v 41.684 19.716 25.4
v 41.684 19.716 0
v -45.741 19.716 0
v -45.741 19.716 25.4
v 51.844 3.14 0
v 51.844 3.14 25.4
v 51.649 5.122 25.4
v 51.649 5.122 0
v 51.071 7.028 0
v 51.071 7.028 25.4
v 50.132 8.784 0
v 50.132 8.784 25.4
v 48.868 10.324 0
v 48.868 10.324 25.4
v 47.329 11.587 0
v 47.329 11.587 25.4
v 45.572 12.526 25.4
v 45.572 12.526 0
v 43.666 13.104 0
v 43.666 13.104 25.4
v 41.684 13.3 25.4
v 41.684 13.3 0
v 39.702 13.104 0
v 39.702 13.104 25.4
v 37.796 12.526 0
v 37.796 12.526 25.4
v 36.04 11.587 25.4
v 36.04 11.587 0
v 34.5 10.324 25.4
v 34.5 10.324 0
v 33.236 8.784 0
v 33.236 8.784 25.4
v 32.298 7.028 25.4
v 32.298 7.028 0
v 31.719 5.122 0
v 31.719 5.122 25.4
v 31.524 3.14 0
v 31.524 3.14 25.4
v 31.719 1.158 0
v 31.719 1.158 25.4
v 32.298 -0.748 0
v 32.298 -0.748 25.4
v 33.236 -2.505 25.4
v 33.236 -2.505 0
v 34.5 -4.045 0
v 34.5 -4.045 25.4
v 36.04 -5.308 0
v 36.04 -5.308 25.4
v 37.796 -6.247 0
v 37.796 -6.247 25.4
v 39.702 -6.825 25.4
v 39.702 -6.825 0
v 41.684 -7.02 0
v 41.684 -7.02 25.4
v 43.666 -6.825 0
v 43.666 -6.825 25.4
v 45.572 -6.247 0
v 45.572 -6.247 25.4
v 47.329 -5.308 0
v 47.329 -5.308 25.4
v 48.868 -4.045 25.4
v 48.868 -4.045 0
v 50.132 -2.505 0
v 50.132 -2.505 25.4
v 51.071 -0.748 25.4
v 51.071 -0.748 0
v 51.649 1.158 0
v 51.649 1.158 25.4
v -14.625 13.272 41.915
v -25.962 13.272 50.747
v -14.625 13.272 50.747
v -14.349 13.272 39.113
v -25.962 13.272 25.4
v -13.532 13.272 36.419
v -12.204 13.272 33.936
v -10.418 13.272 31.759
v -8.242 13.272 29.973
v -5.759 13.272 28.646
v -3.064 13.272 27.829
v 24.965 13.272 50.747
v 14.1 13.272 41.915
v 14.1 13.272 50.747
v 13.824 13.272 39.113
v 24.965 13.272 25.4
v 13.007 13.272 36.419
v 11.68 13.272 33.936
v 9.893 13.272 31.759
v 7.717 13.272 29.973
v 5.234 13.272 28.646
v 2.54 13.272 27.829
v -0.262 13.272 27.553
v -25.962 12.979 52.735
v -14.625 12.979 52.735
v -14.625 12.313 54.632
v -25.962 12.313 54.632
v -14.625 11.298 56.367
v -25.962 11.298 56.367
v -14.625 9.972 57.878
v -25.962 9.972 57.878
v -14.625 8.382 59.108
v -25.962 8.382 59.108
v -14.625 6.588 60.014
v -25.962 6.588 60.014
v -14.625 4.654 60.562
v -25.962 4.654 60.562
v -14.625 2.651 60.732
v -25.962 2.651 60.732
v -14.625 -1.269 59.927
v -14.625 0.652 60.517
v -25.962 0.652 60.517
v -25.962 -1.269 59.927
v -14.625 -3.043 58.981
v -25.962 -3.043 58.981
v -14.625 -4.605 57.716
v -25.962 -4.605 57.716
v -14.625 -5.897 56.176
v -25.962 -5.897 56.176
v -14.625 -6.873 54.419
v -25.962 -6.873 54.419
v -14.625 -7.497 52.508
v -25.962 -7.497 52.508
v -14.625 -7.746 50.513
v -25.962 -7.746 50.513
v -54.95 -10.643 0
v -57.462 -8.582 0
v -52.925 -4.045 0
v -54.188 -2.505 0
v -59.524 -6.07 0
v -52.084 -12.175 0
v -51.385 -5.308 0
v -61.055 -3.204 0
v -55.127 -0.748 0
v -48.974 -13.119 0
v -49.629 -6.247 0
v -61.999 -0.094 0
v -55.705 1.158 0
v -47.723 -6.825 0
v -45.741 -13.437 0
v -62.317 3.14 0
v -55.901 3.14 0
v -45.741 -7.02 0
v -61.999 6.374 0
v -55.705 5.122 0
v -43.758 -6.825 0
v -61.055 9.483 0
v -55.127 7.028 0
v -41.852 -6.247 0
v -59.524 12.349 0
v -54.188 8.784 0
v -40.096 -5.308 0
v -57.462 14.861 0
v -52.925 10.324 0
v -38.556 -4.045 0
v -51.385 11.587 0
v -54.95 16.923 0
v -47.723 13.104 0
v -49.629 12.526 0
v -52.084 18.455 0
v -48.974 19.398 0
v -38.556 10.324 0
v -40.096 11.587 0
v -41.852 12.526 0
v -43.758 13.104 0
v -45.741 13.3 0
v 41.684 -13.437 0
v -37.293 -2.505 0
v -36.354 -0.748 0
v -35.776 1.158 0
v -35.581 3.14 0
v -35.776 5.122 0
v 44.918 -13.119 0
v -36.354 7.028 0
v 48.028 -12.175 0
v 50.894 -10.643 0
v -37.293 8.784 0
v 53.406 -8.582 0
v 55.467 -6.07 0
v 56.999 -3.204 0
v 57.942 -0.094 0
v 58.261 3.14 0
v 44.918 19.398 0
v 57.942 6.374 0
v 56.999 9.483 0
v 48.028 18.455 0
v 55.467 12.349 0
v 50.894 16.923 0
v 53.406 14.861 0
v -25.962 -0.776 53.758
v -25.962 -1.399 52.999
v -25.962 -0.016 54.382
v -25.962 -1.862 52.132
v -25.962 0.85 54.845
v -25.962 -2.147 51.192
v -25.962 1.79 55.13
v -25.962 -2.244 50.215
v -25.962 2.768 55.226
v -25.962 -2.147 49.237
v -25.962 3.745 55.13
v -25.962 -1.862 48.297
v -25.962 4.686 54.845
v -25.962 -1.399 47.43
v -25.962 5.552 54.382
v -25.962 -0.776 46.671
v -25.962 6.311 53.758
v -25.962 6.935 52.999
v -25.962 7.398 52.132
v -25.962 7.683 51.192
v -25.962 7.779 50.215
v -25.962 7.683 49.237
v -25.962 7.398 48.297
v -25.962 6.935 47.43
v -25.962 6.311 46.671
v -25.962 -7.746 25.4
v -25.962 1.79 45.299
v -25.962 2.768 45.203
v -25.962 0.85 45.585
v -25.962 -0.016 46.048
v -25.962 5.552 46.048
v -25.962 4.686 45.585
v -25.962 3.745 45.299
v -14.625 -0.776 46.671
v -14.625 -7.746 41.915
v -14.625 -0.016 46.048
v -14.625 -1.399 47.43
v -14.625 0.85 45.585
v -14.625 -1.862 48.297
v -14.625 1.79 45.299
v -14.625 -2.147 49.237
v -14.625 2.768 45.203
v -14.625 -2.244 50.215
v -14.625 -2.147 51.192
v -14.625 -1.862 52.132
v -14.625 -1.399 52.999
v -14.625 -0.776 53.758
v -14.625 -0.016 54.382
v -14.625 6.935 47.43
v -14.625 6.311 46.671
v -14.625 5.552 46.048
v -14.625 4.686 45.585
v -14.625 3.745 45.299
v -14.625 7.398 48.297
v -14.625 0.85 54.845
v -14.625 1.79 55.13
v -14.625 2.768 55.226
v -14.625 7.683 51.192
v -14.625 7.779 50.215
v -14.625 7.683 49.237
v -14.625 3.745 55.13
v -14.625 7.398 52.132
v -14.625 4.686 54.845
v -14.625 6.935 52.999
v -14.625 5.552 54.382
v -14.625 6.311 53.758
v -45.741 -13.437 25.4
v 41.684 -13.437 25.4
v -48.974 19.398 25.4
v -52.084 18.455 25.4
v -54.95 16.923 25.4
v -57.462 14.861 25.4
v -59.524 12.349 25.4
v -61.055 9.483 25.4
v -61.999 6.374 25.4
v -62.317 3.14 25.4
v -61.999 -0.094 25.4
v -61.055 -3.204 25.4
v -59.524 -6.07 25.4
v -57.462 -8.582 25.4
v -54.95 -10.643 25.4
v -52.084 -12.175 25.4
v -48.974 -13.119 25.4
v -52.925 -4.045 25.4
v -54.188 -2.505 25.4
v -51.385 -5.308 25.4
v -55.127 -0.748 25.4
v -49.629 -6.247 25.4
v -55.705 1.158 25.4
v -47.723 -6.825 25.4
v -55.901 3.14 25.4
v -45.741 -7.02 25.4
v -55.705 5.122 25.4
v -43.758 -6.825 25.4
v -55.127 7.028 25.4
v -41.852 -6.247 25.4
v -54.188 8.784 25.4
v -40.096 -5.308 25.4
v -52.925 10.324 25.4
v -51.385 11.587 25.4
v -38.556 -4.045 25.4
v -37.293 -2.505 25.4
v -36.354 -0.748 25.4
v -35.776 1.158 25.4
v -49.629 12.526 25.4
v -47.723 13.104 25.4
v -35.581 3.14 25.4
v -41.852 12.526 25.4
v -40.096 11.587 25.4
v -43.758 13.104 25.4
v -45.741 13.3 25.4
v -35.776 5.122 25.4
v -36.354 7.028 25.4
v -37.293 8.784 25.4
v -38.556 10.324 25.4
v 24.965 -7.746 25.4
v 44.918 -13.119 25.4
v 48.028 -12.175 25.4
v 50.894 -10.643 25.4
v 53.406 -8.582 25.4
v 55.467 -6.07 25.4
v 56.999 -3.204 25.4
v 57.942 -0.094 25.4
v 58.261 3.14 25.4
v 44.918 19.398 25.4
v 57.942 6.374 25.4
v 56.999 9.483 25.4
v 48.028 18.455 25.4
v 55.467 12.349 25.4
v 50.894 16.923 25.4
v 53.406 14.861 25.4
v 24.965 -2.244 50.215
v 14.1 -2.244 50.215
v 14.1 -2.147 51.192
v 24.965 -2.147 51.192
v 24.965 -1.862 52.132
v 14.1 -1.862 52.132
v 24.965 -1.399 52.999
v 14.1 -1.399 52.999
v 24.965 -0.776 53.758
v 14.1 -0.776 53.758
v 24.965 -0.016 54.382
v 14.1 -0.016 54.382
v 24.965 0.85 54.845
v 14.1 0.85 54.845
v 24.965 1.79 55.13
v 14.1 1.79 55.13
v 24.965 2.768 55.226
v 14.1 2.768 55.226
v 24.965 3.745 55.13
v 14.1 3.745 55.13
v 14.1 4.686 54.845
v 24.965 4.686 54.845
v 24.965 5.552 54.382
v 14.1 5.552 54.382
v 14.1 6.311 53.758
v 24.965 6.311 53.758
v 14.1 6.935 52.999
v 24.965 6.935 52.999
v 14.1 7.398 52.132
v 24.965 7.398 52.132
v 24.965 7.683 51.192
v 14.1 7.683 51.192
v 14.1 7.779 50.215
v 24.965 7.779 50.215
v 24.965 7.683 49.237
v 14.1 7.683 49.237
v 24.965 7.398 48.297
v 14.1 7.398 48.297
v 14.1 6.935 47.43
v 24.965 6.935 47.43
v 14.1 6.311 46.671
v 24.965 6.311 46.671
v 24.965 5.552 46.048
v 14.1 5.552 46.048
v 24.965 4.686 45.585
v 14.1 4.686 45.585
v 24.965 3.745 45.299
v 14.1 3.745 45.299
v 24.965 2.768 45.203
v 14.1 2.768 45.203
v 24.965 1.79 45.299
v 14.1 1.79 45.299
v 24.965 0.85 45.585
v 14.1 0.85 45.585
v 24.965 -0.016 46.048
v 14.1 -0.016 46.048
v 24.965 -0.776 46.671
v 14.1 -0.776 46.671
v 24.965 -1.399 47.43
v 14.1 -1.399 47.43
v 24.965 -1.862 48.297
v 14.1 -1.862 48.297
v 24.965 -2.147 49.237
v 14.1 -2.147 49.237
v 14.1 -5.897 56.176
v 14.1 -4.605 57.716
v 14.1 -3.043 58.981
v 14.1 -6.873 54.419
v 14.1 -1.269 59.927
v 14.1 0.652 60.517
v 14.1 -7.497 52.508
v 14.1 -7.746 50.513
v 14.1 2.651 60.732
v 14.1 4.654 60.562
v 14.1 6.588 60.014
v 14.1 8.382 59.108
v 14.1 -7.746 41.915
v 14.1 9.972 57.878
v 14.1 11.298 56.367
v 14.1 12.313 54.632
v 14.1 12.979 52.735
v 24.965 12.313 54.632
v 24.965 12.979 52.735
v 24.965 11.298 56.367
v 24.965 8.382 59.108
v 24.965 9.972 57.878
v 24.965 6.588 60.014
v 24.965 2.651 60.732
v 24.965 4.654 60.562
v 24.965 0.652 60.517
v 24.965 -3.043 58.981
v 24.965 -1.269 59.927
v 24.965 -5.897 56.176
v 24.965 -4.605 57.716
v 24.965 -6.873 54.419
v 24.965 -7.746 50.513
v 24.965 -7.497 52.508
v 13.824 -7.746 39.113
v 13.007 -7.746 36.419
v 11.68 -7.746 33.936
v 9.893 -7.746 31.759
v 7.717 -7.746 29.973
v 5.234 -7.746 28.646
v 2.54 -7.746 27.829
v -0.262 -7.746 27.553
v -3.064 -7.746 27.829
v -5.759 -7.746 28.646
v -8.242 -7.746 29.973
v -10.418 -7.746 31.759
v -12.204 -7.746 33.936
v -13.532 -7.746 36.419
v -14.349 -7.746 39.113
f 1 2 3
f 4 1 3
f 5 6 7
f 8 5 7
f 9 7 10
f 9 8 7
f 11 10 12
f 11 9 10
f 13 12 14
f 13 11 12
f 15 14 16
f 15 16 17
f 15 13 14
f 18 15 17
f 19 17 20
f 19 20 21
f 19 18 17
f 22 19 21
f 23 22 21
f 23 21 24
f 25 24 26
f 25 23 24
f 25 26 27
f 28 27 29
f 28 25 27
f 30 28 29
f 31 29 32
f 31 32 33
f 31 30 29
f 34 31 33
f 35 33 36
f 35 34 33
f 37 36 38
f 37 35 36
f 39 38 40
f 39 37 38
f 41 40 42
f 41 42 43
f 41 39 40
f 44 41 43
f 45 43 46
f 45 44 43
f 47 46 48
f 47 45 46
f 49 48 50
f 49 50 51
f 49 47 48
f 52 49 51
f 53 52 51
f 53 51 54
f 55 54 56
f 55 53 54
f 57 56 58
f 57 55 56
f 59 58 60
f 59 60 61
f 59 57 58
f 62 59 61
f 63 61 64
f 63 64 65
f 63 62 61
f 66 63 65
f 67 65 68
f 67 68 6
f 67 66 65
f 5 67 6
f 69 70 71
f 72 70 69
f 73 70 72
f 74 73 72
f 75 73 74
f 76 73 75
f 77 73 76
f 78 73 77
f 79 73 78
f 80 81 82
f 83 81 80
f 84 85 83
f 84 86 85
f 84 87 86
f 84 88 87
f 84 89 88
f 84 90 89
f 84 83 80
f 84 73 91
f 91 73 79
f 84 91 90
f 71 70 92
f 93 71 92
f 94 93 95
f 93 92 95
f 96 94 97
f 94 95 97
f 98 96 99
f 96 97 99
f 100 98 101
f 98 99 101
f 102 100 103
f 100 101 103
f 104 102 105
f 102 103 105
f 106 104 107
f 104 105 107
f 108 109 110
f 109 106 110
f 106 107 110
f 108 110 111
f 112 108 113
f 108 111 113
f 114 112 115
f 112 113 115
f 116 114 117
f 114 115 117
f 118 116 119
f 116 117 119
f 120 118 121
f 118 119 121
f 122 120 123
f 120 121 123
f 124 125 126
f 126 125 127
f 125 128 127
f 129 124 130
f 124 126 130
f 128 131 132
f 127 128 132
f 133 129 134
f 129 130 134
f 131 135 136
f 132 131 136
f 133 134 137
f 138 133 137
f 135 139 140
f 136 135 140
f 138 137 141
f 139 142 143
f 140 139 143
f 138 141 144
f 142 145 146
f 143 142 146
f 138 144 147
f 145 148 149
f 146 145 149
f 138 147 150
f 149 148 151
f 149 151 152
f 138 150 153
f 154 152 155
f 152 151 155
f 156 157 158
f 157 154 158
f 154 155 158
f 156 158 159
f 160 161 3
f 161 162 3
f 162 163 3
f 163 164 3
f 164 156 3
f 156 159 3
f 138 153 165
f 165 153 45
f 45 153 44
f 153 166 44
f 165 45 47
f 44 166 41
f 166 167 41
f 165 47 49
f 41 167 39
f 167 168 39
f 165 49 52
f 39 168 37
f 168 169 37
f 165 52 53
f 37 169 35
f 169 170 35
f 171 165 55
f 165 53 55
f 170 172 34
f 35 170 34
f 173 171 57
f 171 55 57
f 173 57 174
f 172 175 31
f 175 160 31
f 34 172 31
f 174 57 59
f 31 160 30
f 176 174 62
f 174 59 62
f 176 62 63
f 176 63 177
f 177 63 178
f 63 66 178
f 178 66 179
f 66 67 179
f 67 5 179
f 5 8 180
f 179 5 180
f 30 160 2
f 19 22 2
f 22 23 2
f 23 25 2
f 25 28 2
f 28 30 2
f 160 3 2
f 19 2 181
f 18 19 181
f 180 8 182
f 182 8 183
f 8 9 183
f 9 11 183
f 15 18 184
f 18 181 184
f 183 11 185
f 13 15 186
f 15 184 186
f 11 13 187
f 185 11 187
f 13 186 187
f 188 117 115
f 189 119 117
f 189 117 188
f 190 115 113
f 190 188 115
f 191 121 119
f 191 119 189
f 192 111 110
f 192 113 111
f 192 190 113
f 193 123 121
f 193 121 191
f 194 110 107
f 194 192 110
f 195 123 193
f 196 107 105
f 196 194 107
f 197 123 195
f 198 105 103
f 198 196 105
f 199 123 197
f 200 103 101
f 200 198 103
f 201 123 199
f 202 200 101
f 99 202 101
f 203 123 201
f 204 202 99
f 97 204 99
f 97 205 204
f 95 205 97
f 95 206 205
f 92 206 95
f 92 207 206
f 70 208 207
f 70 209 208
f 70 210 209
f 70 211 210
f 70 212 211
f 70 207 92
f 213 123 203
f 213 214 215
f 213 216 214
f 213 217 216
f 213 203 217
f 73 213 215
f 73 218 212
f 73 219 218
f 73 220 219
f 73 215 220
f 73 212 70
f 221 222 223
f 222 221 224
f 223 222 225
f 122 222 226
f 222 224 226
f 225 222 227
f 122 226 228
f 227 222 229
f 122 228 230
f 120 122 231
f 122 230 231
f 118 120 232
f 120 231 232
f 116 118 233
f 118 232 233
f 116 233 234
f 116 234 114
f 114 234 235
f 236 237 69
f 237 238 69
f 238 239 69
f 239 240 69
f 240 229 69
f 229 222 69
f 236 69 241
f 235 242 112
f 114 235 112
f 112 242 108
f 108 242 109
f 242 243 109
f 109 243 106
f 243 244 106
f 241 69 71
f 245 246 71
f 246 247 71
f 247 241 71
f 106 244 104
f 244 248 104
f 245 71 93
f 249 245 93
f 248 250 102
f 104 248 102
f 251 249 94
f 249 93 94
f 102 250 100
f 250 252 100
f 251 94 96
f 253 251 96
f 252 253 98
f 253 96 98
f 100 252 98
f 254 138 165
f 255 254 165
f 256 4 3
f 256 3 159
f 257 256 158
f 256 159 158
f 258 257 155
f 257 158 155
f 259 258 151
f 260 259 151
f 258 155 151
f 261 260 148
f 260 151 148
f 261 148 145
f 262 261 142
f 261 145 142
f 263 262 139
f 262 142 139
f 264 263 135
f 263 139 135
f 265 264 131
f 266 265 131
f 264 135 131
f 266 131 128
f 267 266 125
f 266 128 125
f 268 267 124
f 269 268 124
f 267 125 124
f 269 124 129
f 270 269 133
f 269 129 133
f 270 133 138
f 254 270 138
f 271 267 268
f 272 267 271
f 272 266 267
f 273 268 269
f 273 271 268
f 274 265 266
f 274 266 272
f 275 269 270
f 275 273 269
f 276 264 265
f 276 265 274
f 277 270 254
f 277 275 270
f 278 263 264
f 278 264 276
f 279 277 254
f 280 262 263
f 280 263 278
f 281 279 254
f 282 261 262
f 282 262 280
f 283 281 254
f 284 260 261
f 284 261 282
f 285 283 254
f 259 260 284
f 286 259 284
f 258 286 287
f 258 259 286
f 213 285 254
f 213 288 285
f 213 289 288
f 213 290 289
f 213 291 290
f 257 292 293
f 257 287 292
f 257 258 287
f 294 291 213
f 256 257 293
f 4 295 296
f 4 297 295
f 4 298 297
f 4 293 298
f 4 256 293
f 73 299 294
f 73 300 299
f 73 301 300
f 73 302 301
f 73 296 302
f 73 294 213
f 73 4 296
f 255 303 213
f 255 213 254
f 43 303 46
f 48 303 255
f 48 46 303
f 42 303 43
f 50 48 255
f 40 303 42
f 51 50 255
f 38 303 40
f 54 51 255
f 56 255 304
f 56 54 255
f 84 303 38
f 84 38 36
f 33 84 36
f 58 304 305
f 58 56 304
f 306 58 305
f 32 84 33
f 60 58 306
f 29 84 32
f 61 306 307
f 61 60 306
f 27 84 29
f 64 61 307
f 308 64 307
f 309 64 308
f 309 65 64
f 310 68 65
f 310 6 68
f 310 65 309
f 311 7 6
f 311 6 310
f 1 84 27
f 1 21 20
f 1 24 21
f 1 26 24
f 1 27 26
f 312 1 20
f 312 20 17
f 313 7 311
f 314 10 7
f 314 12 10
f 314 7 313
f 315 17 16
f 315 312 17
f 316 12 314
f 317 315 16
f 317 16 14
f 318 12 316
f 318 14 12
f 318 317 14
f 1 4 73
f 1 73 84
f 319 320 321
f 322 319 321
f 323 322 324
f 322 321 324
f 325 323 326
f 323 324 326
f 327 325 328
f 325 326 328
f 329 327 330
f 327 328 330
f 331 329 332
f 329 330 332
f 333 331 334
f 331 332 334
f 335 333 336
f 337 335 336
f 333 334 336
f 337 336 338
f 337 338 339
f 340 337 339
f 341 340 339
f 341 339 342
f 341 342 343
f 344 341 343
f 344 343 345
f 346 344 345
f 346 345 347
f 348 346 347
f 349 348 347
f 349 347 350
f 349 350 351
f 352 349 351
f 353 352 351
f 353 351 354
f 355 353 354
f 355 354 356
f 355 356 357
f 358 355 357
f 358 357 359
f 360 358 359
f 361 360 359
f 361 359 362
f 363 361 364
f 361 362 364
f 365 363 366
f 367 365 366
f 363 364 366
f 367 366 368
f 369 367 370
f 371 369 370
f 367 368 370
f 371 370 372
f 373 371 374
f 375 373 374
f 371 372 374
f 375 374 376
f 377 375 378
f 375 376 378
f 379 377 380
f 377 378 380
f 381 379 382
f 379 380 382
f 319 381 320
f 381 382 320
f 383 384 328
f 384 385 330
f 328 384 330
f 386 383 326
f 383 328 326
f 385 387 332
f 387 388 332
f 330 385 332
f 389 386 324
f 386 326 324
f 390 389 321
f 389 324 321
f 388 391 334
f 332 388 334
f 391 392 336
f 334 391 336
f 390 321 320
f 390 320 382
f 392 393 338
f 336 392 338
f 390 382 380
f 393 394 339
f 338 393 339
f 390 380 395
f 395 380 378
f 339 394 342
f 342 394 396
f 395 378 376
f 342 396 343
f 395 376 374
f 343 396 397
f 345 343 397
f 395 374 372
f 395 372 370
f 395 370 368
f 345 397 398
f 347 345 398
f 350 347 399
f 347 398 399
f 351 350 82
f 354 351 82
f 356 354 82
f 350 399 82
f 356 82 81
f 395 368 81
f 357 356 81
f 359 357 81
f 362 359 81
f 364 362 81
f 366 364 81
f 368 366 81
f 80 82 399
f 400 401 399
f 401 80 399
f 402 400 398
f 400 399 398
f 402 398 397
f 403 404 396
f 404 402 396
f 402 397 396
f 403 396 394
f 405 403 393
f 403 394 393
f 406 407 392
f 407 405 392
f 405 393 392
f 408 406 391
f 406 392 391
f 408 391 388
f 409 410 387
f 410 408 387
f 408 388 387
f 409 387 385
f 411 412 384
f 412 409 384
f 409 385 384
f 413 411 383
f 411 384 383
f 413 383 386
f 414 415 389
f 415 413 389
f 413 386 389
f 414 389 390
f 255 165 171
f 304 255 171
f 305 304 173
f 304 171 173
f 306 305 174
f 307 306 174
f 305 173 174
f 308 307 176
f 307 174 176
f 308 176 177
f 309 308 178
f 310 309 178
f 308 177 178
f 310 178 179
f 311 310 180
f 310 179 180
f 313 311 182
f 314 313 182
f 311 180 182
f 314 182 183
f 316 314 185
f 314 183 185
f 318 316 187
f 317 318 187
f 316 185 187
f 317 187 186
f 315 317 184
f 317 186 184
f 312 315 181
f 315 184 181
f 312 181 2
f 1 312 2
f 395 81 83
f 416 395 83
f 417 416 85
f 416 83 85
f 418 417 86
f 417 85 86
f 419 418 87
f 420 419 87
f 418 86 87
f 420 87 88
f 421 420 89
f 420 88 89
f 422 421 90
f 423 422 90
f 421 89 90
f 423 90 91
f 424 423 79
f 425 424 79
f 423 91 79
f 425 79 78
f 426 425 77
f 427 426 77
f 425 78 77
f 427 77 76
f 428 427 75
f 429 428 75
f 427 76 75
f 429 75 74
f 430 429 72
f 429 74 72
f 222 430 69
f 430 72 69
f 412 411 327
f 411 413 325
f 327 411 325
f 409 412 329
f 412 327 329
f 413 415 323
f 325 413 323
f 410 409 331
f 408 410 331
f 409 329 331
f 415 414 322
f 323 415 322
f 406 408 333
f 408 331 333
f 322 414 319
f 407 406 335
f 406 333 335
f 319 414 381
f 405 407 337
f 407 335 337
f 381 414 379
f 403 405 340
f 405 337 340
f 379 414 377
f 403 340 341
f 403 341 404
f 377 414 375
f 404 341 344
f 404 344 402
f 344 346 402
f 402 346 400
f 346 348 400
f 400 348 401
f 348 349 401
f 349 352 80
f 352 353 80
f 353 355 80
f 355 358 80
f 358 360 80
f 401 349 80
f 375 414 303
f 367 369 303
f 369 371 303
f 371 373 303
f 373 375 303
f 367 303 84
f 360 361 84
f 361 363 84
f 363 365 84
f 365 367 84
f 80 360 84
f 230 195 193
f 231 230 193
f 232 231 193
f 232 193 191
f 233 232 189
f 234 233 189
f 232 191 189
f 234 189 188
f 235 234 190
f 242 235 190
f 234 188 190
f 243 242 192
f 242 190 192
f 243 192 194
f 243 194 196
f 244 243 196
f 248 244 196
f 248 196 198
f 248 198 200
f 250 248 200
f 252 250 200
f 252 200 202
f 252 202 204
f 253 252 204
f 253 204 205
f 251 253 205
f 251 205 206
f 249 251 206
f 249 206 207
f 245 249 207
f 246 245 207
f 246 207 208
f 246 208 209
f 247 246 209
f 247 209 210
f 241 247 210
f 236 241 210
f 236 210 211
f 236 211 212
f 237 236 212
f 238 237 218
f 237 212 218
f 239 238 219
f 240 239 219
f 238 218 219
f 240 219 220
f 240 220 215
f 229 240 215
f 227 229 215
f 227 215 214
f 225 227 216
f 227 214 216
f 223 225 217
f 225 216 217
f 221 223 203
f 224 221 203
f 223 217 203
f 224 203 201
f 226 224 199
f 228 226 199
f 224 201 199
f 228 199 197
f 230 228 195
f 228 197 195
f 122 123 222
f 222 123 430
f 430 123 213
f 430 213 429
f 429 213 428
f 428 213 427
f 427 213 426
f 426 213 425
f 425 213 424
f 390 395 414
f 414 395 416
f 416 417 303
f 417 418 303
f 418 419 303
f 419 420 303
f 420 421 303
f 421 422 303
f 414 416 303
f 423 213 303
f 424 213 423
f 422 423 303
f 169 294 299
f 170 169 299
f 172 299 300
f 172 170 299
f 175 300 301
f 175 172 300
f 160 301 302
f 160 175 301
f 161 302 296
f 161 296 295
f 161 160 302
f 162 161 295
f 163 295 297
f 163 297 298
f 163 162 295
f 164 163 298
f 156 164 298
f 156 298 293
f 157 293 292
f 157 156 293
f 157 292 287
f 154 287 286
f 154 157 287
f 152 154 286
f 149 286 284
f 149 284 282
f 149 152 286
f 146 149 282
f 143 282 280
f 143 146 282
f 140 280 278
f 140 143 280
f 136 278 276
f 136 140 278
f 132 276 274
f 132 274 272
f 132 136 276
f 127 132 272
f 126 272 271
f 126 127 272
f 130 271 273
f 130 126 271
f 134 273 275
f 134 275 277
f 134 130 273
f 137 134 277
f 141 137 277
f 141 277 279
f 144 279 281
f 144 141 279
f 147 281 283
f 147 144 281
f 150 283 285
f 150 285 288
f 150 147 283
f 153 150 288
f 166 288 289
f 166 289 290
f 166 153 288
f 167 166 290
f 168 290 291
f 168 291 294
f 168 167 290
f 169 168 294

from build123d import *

# Parameters (mm, degrees)
F0_R     = 10.16
F1_DEPTH = 25.4
F2_W     = 50.927606
F2_H     = 21.017644
F3_DEPTH = 38.1
F6_DEPTH = 25.4
F7_DEPTH = 58.42
F8_R     = 5.011478
F9_DEPTH = 61.468


with BuildPart() as f1:
    # F0 (on Top) → F1 (new body)
    with BuildSketch(Plane.XY):
        with BuildLine():
            Line((41.684134, 19.716346), (-45.740517, 19.716346))
            ThreePointArc((-45.740517, 19.716346), (-62.317241, 3.139622), (-45.740517, -13.437102))
            Line((-45.740517, -13.437102), (41.684134, -13.437102))
            ThreePointArc((41.684134, -13.437102), (58.260858, 3.139622), (41.684134, 19.716346))
        make_face()
        with Locations((-45.740517, 3.139622)):
            Circle(F0_R, mode=Mode.SUBTRACT)
        with Locations((41.684134, 3.139622)):
            Circle(F0_R, mode=Mode.SUBTRACT)
    extrude(amount=F1_DEPTH)

    # F2 (on face) → F3 (join)
    with BuildSketch(Plane.XY.offset(25.4)):
        with Locations((-0.49852, 2.763115)):
            Rectangle(F2_W, F2_H)
    extrude(amount=F3_DEPTH)

    # F5 (on face) → F6 (cut)
    with BuildSketch(Plane(origin=(0, 13.271937, 0), x_dir=(-1, 0, 0), z_dir=(0, 1, 0))):
        with BuildLine():
            Line((14.624778, 63.5), (-14.100123, 63.5))
            Line((-14.100123, 63.5), (-14.100123, 41.915204))
            ThreePointArc((-14.100123, 41.915204), (0.262327, 27.552754), (14.624778, 41.915204))
            Line((14.624778, 41.915204), (14.624778, 63.5))
        make_face()
    extrude(amount=-F6_DEPTH, mode=Mode.SUBTRACT)

    # F4 (on face) → F7 (cut)
    with BuildSketch(Plane(origin=(-25.962323, 0, 0), x_dir=(0, -1, 0), z_dir=(-1, 0, 0))):
        with BuildLine():
            ThreePointArc((-13.271937, 50.746802), (-2.650794, 60.731682), (7.745707, 50.513107))
            Line((7.745707, 50.513107), (7.745707, 63.5))
            Line((7.745707, 63.5), (-13.271937, 63.5))
            Line((-13.271937, 63.5), (-13.271937, 50.746802))
        make_face()
    extrude(amount=-F7_DEPTH, mode=Mode.SUBTRACT)

    # F8 (on face) → F9 (cut)
    with BuildSketch(Plane(origin=(-25.962323, 0, 0), x_dir=(0, -1, 0), z_dir=(-1, 0, 0))):
        with Locations((-2.767733, 50.214658)):
            Circle(F8_R)
    extrude(amount=-F9_DEPTH, mode=Mode.SUBTRACT)


solid = f1.part
